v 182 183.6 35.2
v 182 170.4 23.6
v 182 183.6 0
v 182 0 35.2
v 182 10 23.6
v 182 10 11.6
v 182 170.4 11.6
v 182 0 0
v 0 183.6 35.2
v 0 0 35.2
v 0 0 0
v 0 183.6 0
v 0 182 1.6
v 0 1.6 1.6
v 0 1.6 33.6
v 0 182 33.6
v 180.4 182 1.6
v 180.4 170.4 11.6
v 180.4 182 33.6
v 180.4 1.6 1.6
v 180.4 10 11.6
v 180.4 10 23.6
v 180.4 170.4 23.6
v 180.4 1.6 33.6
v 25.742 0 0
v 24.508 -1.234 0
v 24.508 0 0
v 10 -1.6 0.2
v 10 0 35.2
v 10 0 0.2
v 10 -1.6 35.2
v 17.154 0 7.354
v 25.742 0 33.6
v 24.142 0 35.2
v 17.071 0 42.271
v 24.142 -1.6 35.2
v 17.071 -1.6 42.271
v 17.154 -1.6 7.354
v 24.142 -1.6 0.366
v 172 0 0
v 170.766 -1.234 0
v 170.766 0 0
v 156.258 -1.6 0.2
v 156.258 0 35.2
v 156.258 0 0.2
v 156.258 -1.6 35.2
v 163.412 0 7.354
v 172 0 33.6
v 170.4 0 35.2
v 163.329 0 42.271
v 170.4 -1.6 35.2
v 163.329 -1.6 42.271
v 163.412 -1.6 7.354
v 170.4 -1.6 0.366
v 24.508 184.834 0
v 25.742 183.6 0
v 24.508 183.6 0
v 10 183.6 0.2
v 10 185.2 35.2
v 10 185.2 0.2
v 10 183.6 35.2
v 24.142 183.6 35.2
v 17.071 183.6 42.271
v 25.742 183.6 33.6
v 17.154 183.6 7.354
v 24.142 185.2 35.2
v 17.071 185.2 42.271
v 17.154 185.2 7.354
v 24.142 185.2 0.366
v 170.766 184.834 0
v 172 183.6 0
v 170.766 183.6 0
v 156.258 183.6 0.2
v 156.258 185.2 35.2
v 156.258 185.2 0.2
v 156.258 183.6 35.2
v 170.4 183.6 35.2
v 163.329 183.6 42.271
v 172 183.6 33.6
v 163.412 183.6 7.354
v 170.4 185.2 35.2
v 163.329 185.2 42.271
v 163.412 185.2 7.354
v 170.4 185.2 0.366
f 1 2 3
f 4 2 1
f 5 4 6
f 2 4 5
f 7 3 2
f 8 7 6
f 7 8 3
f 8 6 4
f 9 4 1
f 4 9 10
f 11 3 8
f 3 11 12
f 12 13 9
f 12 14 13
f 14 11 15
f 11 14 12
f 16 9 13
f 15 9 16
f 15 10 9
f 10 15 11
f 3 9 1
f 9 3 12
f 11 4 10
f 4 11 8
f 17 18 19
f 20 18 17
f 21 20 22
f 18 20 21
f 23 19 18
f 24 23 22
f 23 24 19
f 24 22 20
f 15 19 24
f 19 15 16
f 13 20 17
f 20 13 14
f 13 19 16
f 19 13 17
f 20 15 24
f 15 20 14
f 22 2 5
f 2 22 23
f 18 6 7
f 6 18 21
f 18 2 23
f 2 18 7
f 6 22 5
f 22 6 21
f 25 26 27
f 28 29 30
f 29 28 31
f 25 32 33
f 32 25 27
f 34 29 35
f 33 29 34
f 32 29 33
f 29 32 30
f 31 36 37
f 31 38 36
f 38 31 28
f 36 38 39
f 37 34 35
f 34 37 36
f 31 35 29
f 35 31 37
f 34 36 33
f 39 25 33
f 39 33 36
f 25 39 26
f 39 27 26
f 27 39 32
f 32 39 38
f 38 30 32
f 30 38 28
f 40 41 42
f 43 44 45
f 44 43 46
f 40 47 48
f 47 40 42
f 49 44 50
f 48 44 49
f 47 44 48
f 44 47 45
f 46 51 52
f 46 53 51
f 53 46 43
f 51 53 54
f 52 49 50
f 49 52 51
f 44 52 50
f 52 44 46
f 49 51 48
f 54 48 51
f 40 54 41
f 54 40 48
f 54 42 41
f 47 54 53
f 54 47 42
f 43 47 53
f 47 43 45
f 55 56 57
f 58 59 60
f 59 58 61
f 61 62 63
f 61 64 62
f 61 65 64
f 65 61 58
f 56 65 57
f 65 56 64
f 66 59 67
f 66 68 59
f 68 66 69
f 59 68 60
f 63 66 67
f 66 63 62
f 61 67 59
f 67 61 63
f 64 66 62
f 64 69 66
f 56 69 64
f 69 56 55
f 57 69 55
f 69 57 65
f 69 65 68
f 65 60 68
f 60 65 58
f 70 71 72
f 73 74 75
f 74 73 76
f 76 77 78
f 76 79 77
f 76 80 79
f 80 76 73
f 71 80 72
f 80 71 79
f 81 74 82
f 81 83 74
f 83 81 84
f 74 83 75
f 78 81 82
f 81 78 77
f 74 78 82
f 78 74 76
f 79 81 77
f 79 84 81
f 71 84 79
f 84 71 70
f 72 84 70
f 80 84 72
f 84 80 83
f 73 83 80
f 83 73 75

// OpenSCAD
$fa=4; // default minimum facet angle is now 0.5
$fs=0.05; // default minimum facet size is now 0.05 mm

tolerance = .2;
unit = 20;
wallThickness = 1.6;
barWidth = 10;

internalHeight = 32;

handleHeight = 5;

xUnits = 9;
yUnits = 9;

union() {
  difference() {
    cube([tol(xUnits * unit, -2) + wallThickness, tol(yUnits * unit, -2) + 2 * wallThickness, internalHeight + 2 * wallThickness]);
    translate([-.1, wallThickness, wallThickness]) cube([tol(xUnits * unit, -2) + .1, tol(yUnits * unit, -2), internalHeight]);
    translate([barWidth + wallThickness, barWidth, barWidth + wallThickness]) cube([tol(xUnits * unit, -2), tol(yUnits * unit, -2) - 2 * barWidth, internalHeight - 2 * barWidth]);

    // intersection() {
    //   barAngle = atan(xUnits / yUnits);

    //   translate([- .1, barWidth, internalHeight / -2]) cube([tol(xUnits * unit, -2) - barWidth + .1, tol(yUnits * unit, -2) - 2 * barWidth, 2 * internalHeight]);
    //   difference() {
    //     translate([- .1, barWidth, internalHeight / -2]) cube([tol(xUnits * unit, -2) - barWidth + .1, tol(yUnits * unit, -2) - 2 * barWidth, 2 * internalHeight]);
    //     rotate([0, 0, -barAngle]) translate([-barWidth / 2, 0, internalHeight / -2]) cube([barWidth, diag(xUnits * unit, yUnits * unit), 2 * internalHeight]);
    //     translate([tol(xUnits * unit, -2) + wallThickness, 0, 0]) rotate([0, 0, barAngle]) translate([-barWidth / 2, 0, internalHeight / -2]) cube([barWidth, diag(xUnits * unit, yUnits * unit), 2 * internalHeight]);
    //   }
    // }
  }

  translate([barWidth, -wallThickness, 0]) chevron();
  translate([tol(xUnits * unit, -2) - barWidth - diag(barWidth, barWidth), -wallThickness, 0]) chevron();
  translate([barWidth, tol(yUnits * unit, -2) + 3 * wallThickness, 0]) mirror([0, 1, 0]) chevron();
  translate([tol(xUnits * unit, -2) - barWidth - diag(barWidth, barWidth), tol(yUnits * unit, -2) + 3 * wallThickness, 0]) mirror([0, 1, 0]) chevron();
}

module chevron() {
    difference() {
      union() {
        cube([diag(barWidth, barWidth), wallThickness, internalHeight + 2 * wallThickness]);
        translate([0, 0, internalHeight + 2 * wallThickness]) rotate([0, 45, 0]) cube([barWidth, wallThickness, barWidth]);
        polyhedron(points = [
          [diag(barWidth, barWidth), 0, 0],
          [diag(barWidth, barWidth), wallThickness, 0],
          [diag(barWidth, barWidth) + wallThickness, wallThickness, 0],
          [diag(barWidth, barWidth), 0, internalHeight + 2 * wallThickness],
          [diag(barWidth, barWidth), wallThickness, internalHeight + 2 * wallThickness],
          [diag(barWidth, barWidth) + wallThickness, wallThickness, internalHeight + wallThickness]
        ], faces = [
          [0, 2, 1],
          [3, 4, 5],
          [1, 4, 3, 0],
          [2, 5, 4, 1],
          [5, 2, 0, 3]
        ], convexity = 10);
      }
      translate([-tolerance, -.1, 0]) rotate([0, 45, 0]) cube([tol(barWidth, -2), wallThickness + .2, tol(barWidth, -2)]);
    }
}


function tol(value, m = 1) = value - (m * tolerance);

function diag(x, y) = sqrt(x * x + y * y);
